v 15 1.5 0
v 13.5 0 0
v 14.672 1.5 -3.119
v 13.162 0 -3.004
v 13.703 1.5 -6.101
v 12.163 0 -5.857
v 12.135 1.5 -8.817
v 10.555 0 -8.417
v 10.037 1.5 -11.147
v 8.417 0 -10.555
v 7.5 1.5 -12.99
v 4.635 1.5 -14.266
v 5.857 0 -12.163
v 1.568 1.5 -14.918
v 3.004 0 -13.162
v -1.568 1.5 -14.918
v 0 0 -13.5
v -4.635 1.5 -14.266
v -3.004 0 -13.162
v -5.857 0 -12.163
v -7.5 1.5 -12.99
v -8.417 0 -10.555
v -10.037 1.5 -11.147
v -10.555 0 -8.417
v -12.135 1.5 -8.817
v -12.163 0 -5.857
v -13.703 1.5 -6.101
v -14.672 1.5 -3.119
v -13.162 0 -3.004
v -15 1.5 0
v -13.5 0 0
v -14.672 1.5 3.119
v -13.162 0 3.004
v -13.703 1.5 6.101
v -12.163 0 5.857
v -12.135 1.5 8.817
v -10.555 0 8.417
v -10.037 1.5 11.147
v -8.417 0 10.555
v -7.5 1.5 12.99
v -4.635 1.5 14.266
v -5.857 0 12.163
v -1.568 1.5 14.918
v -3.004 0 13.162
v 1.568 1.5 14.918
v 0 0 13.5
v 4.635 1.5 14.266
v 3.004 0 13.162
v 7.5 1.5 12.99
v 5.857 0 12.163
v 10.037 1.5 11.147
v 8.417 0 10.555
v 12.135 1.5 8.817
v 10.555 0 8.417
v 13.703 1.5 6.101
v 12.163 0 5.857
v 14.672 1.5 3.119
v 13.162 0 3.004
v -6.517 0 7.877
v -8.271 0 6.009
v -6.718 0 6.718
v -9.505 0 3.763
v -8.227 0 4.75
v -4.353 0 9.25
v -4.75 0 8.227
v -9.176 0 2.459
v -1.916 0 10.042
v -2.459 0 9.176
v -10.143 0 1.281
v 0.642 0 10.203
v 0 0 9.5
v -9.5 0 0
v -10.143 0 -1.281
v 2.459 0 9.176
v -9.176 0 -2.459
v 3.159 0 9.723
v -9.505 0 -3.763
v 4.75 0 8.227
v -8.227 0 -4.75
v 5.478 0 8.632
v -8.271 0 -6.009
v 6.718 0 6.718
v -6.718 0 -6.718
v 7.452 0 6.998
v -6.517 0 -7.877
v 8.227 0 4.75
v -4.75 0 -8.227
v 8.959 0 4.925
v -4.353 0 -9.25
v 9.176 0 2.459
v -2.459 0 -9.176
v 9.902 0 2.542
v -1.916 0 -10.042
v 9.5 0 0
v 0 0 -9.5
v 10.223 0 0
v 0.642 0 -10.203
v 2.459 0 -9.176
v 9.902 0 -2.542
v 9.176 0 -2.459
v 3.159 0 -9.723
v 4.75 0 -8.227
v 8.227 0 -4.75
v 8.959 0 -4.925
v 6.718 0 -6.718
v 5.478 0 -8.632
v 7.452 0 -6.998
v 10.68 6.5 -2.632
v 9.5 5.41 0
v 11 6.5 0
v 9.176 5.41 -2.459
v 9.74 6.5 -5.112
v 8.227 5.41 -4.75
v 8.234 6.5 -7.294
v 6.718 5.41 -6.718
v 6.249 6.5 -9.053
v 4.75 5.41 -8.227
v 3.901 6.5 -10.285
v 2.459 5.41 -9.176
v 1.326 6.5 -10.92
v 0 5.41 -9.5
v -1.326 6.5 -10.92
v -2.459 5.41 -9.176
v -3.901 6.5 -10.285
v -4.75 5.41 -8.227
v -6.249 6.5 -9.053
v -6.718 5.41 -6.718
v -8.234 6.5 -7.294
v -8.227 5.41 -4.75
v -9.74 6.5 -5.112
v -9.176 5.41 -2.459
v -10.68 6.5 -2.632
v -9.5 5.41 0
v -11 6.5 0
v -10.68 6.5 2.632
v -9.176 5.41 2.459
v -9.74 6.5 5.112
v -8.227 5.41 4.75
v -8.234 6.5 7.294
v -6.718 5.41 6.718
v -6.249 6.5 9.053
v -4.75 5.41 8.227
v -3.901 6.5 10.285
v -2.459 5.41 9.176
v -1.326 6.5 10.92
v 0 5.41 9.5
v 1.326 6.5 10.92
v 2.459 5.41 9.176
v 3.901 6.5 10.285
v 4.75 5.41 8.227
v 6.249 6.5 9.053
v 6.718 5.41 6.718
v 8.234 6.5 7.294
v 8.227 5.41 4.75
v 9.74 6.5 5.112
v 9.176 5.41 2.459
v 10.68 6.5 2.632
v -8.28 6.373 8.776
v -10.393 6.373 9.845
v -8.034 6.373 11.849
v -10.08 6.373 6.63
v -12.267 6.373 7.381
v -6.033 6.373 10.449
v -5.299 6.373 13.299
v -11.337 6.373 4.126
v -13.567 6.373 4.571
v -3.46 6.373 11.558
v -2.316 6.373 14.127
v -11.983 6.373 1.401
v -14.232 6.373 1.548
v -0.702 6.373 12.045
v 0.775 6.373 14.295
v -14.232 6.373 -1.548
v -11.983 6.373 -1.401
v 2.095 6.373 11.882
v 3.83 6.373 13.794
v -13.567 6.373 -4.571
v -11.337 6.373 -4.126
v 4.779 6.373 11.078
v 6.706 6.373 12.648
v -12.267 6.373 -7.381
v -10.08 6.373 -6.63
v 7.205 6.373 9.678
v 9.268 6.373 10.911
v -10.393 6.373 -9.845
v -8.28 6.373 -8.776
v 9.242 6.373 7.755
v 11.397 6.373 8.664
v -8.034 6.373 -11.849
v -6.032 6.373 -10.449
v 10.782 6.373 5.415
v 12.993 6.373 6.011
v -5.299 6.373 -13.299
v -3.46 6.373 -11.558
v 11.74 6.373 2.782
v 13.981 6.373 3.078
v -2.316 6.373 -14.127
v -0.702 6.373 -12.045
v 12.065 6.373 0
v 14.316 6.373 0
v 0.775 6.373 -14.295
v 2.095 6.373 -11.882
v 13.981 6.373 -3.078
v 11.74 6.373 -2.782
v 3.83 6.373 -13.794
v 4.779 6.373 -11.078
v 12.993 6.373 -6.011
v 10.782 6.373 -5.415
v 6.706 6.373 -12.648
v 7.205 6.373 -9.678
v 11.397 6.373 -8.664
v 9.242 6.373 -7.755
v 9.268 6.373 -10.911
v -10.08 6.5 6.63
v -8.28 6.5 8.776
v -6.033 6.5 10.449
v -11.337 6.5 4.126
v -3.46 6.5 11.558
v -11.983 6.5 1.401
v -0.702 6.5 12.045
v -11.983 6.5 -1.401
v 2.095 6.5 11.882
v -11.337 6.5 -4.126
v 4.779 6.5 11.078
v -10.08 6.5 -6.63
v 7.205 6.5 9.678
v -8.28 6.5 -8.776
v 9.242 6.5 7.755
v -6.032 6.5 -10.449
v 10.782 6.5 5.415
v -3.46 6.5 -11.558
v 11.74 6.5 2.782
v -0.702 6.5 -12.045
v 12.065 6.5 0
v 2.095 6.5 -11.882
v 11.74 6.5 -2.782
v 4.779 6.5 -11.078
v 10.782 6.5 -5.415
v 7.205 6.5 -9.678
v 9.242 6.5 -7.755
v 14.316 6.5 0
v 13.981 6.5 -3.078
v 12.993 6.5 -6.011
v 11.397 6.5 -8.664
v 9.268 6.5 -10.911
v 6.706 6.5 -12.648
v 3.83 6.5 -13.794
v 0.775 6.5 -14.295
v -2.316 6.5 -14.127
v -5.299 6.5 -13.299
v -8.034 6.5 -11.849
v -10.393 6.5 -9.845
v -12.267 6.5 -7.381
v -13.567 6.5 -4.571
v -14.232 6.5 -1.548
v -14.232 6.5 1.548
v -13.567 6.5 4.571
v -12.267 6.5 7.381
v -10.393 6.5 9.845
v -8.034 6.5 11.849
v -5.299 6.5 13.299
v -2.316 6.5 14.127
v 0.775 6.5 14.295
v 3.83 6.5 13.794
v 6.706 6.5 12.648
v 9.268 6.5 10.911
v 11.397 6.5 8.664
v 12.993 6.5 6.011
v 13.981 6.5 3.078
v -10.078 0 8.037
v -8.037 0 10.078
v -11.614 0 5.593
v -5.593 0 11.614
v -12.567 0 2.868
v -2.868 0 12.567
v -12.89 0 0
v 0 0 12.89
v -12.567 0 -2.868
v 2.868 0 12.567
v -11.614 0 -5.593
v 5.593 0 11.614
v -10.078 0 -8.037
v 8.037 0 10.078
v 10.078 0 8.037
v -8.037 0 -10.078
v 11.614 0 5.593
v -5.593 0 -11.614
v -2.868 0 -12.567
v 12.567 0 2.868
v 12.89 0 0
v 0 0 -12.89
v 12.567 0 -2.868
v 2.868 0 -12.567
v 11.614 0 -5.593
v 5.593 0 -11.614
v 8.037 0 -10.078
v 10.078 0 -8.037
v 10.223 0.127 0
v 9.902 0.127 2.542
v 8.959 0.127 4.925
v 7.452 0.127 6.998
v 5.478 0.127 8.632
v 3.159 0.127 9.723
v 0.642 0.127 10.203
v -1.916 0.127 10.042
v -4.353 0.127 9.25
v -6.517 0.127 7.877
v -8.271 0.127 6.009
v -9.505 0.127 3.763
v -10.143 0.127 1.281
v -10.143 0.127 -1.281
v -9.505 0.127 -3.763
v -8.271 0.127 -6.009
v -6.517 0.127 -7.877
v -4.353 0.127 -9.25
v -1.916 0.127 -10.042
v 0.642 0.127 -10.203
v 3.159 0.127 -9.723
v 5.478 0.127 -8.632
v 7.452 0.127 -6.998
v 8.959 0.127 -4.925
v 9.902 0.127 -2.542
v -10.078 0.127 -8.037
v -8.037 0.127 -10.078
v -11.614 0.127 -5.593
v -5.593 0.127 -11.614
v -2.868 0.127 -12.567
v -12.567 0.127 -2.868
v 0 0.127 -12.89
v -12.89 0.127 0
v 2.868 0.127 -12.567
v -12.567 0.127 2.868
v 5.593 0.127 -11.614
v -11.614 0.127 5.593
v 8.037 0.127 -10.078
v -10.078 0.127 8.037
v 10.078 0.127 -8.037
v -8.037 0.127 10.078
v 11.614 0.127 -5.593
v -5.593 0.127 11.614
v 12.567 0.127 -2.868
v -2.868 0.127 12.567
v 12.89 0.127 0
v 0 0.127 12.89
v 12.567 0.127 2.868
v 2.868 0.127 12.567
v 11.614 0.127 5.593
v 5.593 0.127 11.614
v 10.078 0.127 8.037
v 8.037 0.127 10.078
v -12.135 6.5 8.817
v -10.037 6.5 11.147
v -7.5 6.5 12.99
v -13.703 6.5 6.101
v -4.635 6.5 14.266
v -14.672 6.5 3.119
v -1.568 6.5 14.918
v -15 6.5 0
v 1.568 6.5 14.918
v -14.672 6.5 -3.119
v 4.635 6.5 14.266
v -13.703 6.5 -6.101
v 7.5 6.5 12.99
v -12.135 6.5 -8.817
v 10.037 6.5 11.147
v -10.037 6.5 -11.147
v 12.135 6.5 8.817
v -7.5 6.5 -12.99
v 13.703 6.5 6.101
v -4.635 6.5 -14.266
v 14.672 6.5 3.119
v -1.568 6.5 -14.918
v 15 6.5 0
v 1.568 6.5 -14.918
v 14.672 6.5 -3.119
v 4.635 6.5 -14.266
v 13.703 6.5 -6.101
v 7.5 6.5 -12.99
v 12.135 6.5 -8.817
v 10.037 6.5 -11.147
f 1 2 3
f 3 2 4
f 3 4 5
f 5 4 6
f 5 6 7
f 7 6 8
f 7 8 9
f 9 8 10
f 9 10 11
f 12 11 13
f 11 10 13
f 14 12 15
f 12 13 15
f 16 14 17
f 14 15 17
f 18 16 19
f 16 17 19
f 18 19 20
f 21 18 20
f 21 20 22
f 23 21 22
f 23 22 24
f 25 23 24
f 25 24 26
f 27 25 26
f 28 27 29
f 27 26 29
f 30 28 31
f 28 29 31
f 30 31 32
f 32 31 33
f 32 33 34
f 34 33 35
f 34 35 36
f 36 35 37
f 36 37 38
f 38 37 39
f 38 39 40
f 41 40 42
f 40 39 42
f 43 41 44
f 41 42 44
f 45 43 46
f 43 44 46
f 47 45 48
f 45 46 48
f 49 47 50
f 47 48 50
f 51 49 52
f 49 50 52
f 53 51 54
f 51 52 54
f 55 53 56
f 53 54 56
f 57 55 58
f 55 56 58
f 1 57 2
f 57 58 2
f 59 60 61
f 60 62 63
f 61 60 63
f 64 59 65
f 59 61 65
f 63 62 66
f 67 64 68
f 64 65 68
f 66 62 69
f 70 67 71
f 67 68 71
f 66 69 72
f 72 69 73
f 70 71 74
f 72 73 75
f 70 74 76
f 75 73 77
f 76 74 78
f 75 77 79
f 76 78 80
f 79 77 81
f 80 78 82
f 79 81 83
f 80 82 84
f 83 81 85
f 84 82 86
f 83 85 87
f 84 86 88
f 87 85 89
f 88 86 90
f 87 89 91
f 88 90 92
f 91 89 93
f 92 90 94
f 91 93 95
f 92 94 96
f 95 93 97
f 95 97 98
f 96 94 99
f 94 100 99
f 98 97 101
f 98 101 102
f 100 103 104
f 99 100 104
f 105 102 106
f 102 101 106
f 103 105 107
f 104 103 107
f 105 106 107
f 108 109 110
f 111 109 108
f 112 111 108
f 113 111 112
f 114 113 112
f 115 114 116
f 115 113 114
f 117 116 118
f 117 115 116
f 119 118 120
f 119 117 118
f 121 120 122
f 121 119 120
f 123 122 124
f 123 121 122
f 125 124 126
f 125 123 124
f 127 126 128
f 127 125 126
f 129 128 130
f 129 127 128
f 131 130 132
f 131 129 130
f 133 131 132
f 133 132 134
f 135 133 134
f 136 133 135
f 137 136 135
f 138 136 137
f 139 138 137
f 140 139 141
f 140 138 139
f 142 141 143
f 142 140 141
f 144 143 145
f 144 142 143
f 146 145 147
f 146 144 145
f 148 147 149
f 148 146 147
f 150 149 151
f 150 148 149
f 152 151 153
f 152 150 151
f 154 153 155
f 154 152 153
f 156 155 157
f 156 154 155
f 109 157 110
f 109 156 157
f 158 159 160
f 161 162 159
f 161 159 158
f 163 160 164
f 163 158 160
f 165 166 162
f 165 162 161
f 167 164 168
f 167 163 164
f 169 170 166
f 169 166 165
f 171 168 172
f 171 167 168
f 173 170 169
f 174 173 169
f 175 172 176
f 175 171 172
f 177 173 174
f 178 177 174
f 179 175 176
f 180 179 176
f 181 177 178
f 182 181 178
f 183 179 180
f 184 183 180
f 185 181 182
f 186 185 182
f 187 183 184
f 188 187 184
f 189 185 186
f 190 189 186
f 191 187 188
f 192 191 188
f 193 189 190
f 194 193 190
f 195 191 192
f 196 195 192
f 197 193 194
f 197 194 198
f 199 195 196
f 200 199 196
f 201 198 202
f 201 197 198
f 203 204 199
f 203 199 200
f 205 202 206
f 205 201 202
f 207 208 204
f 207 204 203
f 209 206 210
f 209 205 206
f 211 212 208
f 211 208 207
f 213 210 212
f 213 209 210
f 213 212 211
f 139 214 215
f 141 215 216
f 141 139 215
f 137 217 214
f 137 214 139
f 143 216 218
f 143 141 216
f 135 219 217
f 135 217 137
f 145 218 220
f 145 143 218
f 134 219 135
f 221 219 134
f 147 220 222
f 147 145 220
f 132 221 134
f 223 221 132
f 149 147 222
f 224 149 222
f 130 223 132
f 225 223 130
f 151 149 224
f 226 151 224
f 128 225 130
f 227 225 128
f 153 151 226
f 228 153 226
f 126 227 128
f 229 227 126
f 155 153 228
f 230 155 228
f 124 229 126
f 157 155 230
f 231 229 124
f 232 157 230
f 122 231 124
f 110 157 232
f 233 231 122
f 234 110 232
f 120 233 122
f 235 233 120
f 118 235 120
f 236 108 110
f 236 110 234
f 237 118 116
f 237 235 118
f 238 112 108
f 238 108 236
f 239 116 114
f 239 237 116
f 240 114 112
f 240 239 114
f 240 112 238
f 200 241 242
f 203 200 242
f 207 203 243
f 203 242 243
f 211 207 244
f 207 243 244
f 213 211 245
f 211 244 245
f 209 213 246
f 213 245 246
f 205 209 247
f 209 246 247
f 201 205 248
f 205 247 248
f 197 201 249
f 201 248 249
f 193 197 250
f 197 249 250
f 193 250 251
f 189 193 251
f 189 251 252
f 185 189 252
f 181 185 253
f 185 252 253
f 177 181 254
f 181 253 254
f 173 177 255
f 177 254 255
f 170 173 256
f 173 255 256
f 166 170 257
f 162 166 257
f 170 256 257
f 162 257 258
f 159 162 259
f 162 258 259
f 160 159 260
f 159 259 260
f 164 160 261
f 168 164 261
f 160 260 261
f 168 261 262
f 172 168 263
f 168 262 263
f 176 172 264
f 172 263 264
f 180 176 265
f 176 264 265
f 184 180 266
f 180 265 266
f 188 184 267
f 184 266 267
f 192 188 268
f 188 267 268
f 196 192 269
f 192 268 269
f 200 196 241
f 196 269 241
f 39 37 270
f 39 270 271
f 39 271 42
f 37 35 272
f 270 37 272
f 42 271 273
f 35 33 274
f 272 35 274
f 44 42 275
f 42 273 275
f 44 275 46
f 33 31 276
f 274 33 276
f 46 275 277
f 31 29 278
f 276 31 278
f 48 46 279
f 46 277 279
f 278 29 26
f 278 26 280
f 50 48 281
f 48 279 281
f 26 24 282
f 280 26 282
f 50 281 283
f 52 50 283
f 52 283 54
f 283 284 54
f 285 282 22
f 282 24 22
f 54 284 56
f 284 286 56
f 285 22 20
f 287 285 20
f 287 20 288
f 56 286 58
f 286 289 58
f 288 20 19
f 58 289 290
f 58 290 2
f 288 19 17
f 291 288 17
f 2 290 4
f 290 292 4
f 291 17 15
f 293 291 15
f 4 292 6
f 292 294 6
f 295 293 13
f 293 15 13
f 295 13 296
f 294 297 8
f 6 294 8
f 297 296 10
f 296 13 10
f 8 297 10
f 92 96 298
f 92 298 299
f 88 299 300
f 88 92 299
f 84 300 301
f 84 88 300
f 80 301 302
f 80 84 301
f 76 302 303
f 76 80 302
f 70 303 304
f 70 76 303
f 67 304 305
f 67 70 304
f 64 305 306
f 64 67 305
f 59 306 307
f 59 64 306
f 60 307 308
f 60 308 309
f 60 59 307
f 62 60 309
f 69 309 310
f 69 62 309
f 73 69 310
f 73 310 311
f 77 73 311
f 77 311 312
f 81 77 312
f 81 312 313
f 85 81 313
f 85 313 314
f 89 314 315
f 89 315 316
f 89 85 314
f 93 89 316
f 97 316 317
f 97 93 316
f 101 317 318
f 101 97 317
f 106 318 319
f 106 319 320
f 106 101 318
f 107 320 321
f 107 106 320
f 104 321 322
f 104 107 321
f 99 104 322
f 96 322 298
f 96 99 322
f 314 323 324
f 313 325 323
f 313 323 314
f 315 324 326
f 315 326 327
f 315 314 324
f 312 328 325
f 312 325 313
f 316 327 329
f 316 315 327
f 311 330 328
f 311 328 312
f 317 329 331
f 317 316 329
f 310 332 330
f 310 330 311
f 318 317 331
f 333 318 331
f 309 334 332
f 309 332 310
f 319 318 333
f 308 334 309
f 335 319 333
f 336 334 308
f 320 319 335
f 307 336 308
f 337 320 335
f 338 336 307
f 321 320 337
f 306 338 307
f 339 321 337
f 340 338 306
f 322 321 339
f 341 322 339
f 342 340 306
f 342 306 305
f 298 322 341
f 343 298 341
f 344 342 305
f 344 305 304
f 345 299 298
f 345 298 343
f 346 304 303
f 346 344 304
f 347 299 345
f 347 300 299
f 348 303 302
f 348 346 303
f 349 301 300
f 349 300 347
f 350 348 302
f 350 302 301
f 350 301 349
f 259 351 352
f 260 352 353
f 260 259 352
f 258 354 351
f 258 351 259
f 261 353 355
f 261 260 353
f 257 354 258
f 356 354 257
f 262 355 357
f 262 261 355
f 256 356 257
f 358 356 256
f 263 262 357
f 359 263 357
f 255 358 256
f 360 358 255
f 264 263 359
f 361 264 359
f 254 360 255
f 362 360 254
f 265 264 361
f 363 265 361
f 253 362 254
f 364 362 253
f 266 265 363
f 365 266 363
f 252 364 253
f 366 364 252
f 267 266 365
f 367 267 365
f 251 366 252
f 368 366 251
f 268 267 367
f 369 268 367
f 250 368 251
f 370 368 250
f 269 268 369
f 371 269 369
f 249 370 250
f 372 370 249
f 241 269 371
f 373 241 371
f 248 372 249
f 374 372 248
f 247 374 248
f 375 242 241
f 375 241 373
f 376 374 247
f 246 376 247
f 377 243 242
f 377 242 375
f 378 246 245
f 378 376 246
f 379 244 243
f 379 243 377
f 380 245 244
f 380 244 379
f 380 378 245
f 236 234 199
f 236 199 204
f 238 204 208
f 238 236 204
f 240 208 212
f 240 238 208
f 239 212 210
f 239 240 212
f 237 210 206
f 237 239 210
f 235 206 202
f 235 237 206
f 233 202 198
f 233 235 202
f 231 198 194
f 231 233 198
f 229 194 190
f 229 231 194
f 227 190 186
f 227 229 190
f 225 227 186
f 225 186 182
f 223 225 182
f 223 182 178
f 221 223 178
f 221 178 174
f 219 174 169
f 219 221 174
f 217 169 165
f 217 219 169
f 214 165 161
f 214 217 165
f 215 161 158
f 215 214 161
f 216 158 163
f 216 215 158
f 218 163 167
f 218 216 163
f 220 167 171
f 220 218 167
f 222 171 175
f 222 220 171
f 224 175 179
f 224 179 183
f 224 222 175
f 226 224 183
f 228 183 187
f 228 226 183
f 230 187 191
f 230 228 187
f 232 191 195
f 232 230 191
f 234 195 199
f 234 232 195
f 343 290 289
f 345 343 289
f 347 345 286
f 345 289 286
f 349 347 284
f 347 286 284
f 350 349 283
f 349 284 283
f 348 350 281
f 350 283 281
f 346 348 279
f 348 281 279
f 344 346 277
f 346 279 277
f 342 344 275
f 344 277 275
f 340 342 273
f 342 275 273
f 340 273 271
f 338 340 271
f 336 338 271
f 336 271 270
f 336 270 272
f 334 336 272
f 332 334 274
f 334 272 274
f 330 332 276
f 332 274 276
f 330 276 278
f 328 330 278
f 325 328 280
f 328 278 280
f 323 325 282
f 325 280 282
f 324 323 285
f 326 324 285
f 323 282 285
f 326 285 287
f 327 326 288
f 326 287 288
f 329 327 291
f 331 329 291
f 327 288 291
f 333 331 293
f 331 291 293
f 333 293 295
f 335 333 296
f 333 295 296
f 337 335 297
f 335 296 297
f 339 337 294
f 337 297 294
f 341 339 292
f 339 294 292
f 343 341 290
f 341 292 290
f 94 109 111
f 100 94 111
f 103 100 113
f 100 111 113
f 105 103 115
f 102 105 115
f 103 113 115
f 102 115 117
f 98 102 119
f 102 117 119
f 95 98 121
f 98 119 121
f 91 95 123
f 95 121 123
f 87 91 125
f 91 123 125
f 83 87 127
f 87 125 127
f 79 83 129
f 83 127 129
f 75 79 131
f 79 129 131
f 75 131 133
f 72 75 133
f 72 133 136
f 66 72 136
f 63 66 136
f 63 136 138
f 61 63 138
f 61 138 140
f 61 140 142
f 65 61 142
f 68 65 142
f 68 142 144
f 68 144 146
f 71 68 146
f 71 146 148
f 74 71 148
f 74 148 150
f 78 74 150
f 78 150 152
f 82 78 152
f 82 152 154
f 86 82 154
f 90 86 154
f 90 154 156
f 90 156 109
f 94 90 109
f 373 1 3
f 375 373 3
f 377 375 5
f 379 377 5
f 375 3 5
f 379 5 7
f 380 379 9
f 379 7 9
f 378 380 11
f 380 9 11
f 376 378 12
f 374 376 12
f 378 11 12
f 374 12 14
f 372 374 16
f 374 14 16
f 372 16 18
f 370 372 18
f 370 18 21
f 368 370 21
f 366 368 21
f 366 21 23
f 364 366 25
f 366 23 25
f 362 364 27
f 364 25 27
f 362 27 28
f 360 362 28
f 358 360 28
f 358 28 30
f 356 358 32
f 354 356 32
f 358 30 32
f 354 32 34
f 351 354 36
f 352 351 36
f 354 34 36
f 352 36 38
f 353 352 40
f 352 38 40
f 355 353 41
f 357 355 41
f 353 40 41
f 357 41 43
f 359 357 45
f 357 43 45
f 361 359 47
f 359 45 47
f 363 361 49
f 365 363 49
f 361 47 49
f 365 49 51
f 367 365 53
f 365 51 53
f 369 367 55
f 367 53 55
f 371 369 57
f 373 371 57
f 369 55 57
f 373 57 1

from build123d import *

# Parameters (mm, degrees)
SKETCH1_R           = 15
BOSS_EXTRUDE1_DEPTH = 6.5
SKETCH2_R           = 9.5
CUT_EXTRUDE1_DEPTH  = 7.5
CHAMFER1_SIZE       = 1.5
CHAMFER2_SIZE       = 1.5
CHAMFER2_SIZE2      = 1.089813792
SKETCH3_R           = 12.8905
SKETCH3_R_2         = 10.223184072
CUT_EXTRUDE2_DEPTH  = 0.127
SKETCH4_R           = 14.316034094
SKETCH4_R_2         = 12.065
CUT_EXTRUDE3_DEPTH  = 0.127


with BuildPart() as part:
    # Sketch1 → Boss-Extrude1 (new body)
    with BuildSketch(Plane(origin=(0, 0, 0), x_dir=(1, 0, 0), z_dir=(0, 1, 0))):
        Circle(SKETCH1_R)
    extrude(amount=BOSS_EXTRUDE1_DEPTH)

    # Sketch2 → Cut-Extrude1 (cut, through all)
    with BuildSketch(Plane(origin=(0, 6.5, 0), x_dir=(1, 0, 0), z_dir=(0, 1, 0))):
        Circle(SKETCH2_R)
    extrude(amount=-CUT_EXTRUDE1_DEPTH, mode=Mode.SUBTRACT)

    # Chamfer1
    chamfer1_edges = [part.edges().sort_by_distance(p)[0] for p in [
        (-15, 0, 0),
    ]]
    chamfer(chamfer1_edges, length=CHAMFER1_SIZE)

    # Chamfer2
    chamfer2_edges = [part.edges().sort_by_distance(p)[0] for p in [
        (-9.5, 6.5, 0),
    ]]
    chamfer2_side = [part.faces().sort_by_distance(p)[0] for p in [
        (-14.575735931, 6.5, 0),
    ]]
    chamfer(chamfer2_edges, length=CHAMFER2_SIZE, length2=CHAMFER2_SIZE2, reference=chamfer2_side[0])

    # Sketch3 → Cut-Extrude2 (cut)
    with BuildSketch(Plane.XZ):
        Circle(SKETCH3_R)
        Circle(SKETCH3_R_2, mode=Mode.SUBTRACT)
    extrude(amount=-CUT_EXTRUDE2_DEPTH, mode=Mode.SUBTRACT)

    # Sketch4 → Cut-Extrude3 (cut)
    with BuildSketch(Plane(origin=(0, 6.5, 0), x_dir=(1, 0, 0), z_dir=(0, 1, 0))):
        Circle(SKETCH4_R)
        Circle(SKETCH4_R_2, mode=Mode.SUBTRACT)
    extrude(amount=-CUT_EXTRUDE3_DEPTH, mode=Mode.SUBTRACT)


solid = part.part
